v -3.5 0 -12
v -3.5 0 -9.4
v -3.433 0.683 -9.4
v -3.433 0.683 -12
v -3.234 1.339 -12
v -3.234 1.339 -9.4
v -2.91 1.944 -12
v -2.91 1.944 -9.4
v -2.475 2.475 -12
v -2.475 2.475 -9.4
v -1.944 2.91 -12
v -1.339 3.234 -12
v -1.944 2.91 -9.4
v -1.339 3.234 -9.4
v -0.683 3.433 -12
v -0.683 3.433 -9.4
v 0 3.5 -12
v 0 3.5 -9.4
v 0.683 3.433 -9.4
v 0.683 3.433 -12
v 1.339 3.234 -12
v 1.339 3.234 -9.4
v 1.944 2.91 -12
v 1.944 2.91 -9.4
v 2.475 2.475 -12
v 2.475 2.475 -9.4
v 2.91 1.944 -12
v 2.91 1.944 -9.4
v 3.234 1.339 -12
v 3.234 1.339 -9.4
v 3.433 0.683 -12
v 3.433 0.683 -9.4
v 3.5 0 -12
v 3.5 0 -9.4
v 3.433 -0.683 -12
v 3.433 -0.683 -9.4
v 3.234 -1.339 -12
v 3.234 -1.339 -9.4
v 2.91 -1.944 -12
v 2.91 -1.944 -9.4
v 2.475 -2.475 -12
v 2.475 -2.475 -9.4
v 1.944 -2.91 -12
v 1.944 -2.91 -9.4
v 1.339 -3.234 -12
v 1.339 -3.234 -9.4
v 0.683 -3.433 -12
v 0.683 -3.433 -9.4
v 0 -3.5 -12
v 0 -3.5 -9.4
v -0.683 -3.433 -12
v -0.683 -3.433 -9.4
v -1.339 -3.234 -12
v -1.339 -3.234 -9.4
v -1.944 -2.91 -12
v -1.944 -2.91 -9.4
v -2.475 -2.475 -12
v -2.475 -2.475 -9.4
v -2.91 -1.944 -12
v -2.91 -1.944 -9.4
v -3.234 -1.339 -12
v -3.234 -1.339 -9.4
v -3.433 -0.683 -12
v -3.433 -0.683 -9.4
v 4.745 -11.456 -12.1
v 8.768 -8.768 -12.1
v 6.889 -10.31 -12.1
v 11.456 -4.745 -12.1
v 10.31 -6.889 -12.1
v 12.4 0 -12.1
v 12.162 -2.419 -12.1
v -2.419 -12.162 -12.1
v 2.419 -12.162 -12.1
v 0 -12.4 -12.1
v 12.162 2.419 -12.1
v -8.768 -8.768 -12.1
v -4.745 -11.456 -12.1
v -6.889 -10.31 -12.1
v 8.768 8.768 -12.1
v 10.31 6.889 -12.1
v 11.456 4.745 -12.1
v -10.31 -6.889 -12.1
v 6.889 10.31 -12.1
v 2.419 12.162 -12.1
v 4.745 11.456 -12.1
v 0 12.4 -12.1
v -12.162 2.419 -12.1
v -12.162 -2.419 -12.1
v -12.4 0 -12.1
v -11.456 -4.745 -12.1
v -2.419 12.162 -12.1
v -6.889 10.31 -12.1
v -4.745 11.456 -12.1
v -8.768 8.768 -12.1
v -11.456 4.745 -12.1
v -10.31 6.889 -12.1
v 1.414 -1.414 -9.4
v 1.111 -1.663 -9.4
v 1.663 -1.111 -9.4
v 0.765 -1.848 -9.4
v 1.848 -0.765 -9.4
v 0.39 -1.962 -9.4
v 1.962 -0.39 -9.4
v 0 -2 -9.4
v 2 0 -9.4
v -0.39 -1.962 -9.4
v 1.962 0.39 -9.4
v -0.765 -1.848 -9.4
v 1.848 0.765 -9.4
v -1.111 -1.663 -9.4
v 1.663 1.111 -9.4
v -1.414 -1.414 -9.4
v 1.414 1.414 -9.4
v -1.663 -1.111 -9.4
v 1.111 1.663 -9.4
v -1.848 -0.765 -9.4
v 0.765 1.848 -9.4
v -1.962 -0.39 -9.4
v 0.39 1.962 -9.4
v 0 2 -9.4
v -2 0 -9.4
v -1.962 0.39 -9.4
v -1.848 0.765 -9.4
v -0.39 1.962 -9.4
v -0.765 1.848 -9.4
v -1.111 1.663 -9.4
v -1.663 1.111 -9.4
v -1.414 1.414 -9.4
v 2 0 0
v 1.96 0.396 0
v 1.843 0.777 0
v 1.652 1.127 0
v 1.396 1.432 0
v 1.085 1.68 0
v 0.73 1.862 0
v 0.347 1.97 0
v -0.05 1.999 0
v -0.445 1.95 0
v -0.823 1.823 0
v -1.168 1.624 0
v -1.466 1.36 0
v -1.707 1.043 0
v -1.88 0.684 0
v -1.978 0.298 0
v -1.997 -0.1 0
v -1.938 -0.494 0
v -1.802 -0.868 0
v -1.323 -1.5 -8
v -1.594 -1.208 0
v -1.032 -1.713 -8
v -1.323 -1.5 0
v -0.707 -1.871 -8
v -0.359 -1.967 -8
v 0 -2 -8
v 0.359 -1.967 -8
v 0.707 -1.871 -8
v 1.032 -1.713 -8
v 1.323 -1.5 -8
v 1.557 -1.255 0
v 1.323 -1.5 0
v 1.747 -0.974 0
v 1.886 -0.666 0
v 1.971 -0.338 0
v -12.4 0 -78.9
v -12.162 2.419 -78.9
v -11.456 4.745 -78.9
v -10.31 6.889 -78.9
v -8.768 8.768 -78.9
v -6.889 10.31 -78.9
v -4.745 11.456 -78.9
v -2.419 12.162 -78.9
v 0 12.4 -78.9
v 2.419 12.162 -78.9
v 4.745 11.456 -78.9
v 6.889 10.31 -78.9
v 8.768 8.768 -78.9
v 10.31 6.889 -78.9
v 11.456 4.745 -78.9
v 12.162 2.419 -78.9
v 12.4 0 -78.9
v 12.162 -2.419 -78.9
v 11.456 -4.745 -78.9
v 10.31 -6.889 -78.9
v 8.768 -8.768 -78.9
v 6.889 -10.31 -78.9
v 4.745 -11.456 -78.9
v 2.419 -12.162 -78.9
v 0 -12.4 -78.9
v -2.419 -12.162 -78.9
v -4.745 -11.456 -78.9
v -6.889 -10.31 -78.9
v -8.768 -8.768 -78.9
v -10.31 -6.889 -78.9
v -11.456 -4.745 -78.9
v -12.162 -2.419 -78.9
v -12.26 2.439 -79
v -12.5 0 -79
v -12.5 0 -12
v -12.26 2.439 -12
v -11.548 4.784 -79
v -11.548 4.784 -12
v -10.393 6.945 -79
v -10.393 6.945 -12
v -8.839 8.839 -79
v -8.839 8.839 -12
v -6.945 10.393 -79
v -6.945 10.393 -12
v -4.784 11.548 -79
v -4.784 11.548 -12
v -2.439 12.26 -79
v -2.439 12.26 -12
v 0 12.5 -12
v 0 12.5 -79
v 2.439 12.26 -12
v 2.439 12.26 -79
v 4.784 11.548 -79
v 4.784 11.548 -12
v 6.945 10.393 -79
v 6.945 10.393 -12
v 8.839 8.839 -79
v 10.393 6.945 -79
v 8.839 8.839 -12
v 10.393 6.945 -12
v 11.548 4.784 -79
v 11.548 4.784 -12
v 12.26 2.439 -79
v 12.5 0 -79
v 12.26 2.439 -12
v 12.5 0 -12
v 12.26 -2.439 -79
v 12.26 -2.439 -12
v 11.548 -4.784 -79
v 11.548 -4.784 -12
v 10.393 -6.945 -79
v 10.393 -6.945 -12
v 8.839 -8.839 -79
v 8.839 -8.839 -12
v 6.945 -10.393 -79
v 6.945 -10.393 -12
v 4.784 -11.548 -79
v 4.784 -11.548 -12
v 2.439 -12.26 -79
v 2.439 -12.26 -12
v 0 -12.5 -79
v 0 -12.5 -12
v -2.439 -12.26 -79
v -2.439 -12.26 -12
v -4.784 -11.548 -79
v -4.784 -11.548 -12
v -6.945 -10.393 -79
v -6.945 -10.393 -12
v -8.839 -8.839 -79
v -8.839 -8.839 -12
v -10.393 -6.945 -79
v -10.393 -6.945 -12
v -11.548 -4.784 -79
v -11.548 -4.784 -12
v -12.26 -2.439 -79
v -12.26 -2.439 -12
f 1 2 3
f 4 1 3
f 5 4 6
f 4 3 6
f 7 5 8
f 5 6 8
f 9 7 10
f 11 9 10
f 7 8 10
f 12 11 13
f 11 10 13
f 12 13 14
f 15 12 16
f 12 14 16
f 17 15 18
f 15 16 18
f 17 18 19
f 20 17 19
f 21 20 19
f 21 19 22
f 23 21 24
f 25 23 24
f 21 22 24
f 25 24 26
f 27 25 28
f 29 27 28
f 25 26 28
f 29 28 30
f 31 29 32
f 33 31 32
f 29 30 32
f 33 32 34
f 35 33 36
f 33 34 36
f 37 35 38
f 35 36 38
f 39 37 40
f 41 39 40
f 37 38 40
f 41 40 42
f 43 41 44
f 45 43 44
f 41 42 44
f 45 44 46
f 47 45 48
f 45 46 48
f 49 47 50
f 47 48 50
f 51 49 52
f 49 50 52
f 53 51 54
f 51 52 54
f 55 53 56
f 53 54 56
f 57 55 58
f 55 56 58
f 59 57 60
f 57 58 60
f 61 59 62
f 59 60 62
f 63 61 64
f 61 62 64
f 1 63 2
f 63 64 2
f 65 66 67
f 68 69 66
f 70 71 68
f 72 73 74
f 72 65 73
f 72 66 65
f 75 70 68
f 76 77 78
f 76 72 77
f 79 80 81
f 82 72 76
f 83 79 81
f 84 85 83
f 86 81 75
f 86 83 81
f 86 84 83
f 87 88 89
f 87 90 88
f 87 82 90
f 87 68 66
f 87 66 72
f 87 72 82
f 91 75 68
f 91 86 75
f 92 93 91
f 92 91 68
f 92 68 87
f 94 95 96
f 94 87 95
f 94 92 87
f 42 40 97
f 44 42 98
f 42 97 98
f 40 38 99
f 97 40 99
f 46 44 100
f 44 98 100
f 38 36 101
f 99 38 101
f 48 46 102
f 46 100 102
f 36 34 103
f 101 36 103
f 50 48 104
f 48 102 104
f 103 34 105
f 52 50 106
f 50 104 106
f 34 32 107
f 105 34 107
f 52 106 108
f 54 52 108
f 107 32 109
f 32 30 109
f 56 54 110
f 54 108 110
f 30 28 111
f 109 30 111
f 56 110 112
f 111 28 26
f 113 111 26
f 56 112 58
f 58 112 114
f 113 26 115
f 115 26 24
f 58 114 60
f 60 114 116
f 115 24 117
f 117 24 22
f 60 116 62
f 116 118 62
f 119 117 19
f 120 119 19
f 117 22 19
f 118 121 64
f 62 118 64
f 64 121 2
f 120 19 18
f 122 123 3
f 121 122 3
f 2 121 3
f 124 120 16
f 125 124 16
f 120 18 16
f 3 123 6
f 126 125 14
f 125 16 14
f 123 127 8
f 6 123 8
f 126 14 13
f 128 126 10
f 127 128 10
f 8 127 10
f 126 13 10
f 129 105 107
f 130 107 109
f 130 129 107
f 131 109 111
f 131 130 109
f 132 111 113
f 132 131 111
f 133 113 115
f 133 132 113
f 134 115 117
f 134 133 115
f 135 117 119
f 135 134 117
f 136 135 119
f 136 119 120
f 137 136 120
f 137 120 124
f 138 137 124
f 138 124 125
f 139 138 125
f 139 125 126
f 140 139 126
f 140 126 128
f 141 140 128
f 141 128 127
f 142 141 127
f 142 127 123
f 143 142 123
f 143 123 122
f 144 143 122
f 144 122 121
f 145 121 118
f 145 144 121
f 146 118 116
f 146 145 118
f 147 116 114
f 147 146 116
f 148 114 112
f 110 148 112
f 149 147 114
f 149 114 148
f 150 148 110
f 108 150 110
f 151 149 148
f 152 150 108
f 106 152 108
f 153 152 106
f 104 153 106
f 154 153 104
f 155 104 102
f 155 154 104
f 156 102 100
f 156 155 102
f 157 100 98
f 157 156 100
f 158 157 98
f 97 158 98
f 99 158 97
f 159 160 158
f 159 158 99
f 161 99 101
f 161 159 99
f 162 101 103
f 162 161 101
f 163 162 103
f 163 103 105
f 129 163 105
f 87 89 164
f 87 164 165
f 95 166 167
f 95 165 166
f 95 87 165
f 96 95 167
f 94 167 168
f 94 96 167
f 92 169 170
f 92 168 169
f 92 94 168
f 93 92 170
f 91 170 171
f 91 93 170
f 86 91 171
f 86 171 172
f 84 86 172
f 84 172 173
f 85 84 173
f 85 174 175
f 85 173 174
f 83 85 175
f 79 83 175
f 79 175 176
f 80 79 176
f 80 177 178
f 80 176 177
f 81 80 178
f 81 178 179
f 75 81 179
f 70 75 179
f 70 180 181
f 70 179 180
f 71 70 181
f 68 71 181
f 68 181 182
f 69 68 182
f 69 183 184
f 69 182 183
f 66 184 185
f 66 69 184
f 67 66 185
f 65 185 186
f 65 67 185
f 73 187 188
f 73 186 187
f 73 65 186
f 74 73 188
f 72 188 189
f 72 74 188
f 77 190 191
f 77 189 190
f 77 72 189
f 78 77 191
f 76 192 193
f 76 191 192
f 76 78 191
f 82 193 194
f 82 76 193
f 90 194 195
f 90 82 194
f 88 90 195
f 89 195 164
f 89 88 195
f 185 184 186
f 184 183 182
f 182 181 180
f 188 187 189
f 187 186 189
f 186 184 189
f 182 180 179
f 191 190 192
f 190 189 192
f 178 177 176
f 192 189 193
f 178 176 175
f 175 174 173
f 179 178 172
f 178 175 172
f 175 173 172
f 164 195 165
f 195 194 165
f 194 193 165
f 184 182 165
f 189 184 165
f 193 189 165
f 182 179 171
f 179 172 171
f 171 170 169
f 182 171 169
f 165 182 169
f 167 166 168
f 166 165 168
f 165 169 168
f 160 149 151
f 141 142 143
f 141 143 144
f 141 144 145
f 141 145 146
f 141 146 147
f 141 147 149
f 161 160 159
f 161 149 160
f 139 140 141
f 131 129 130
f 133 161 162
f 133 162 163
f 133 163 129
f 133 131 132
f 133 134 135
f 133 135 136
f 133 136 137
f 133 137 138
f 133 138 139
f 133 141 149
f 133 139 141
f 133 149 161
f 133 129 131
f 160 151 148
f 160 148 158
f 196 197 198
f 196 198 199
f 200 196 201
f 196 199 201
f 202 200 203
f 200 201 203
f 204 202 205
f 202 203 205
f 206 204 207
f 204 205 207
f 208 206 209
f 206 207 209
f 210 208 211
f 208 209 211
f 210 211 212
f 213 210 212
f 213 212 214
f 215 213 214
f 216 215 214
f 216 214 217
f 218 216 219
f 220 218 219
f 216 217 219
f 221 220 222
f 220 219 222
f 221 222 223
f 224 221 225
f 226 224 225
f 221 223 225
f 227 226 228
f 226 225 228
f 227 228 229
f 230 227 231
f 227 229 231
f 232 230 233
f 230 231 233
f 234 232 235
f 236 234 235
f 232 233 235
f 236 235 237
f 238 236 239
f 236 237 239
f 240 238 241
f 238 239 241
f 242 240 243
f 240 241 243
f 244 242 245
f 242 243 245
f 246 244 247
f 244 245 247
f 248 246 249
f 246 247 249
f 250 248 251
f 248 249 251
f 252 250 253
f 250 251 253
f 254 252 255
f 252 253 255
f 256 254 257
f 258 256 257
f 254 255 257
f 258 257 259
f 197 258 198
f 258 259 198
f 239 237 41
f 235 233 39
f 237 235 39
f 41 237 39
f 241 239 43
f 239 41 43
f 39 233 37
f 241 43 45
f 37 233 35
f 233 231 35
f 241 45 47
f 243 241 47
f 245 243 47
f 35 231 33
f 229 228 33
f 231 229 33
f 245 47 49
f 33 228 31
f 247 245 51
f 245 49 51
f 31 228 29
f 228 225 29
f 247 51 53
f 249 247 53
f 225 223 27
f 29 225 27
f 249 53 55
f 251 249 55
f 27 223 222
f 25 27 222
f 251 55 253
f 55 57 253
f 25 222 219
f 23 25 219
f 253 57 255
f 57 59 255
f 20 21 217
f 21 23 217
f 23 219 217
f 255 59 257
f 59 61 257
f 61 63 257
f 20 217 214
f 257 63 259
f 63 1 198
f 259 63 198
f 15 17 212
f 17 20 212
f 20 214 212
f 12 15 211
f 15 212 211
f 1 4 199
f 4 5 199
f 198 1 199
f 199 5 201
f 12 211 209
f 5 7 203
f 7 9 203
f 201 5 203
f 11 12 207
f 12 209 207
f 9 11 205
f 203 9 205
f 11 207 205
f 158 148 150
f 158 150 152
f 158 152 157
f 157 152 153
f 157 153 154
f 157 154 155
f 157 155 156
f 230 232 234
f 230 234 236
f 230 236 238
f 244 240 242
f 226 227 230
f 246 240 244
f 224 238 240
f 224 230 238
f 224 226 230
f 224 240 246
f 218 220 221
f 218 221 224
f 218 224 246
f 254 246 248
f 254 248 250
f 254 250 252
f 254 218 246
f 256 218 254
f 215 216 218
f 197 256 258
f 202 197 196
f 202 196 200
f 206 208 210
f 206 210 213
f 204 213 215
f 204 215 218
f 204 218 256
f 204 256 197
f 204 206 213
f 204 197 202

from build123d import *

# Parameters (mm, degrees)
SKETCH1_R           = 2
BOSS_EXTRUDE1_DEPTH = 9.4
SKETCH2_W           = 6
SKETCH2_H           = 0.5
CUT_EXTRUDE1_DEPTH  = 8
SKETCH3_R           = 3.5
BOSS_EXTRUDE2_DEPTH = 2.6
SKETCH4_R           = 12.5
SKETCH4_R_2         = 12.4
EXTRUDE_THIN1_DEPTH = 67
SKETCH6_R           = 12.5
BOSS_EXTRUDE4_DEPTH = 0.1
BOSS_EXTRUDE5_START = -0.1
SKETCH7_R           = 12.5
BOSS_EXTRUDE5_DEPTH = 0.1


with BuildPart() as part:
    # Sketch1 → Boss-Extrude1 (new body)
    with BuildSketch(Plane.XY):
        Circle(SKETCH1_R)
    extrude(amount=-BOSS_EXTRUDE1_DEPTH)

    # Sketch2 → Cut-Extrude1 (cut)
    with BuildSketch(Plane.XY):
        with Locations((0.35899941, -1.75)):
            Rectangle(SKETCH2_W, SKETCH2_H)
    extrude(amount=-CUT_EXTRUDE1_DEPTH, mode=Mode.SUBTRACT)

    # Sketch3 → Boss-Extrude2 (add)
    with BuildSketch(Plane(origin=(0, 0, -9.4), x_dir=(-1, 0, 0), z_dir=(0, 0, -1))):
        Circle(SKETCH3_R)
    extrude(amount=BOSS_EXTRUDE2_DEPTH)



with BuildPart() as body_2:
    # Sketch4 → Extrude-Thin1 (new body)
    with BuildSketch(Plane(origin=(0, 0, -12), x_dir=(-1, 0, 0), z_dir=(0, 0, -1))):
        Circle(SKETCH4_R)
        Circle(SKETCH4_R_2, mode=Mode.SUBTRACT)
    extrude(amount=EXTRUDE_THIN1_DEPTH)


with BuildPart() as part_1:
    add(part.part)

    add(body_2.part)  # Boss-Extrude4 merges body 2
    # Sketch6 → Boss-Extrude4 (add)
    with BuildSketch(Plane(origin=(0, 0, -12), x_dir=(-1, 0, 0), z_dir=(0, 0, -1))):
        Circle(SKETCH6_R)
    extrude(amount=BOSS_EXTRUDE4_DEPTH)

    # Sketch7 → Boss-Extrude5 (add)
    with BuildSketch(Plane(origin=(0, 0, -79), x_dir=(-1, 0, 0), z_dir=(0, 0, -1)).offset(BOSS_EXTRUDE5_START)):
        Circle(SKETCH7_R)
    extrude(amount=BOSS_EXTRUDE5_DEPTH)


solid = part_1.part
